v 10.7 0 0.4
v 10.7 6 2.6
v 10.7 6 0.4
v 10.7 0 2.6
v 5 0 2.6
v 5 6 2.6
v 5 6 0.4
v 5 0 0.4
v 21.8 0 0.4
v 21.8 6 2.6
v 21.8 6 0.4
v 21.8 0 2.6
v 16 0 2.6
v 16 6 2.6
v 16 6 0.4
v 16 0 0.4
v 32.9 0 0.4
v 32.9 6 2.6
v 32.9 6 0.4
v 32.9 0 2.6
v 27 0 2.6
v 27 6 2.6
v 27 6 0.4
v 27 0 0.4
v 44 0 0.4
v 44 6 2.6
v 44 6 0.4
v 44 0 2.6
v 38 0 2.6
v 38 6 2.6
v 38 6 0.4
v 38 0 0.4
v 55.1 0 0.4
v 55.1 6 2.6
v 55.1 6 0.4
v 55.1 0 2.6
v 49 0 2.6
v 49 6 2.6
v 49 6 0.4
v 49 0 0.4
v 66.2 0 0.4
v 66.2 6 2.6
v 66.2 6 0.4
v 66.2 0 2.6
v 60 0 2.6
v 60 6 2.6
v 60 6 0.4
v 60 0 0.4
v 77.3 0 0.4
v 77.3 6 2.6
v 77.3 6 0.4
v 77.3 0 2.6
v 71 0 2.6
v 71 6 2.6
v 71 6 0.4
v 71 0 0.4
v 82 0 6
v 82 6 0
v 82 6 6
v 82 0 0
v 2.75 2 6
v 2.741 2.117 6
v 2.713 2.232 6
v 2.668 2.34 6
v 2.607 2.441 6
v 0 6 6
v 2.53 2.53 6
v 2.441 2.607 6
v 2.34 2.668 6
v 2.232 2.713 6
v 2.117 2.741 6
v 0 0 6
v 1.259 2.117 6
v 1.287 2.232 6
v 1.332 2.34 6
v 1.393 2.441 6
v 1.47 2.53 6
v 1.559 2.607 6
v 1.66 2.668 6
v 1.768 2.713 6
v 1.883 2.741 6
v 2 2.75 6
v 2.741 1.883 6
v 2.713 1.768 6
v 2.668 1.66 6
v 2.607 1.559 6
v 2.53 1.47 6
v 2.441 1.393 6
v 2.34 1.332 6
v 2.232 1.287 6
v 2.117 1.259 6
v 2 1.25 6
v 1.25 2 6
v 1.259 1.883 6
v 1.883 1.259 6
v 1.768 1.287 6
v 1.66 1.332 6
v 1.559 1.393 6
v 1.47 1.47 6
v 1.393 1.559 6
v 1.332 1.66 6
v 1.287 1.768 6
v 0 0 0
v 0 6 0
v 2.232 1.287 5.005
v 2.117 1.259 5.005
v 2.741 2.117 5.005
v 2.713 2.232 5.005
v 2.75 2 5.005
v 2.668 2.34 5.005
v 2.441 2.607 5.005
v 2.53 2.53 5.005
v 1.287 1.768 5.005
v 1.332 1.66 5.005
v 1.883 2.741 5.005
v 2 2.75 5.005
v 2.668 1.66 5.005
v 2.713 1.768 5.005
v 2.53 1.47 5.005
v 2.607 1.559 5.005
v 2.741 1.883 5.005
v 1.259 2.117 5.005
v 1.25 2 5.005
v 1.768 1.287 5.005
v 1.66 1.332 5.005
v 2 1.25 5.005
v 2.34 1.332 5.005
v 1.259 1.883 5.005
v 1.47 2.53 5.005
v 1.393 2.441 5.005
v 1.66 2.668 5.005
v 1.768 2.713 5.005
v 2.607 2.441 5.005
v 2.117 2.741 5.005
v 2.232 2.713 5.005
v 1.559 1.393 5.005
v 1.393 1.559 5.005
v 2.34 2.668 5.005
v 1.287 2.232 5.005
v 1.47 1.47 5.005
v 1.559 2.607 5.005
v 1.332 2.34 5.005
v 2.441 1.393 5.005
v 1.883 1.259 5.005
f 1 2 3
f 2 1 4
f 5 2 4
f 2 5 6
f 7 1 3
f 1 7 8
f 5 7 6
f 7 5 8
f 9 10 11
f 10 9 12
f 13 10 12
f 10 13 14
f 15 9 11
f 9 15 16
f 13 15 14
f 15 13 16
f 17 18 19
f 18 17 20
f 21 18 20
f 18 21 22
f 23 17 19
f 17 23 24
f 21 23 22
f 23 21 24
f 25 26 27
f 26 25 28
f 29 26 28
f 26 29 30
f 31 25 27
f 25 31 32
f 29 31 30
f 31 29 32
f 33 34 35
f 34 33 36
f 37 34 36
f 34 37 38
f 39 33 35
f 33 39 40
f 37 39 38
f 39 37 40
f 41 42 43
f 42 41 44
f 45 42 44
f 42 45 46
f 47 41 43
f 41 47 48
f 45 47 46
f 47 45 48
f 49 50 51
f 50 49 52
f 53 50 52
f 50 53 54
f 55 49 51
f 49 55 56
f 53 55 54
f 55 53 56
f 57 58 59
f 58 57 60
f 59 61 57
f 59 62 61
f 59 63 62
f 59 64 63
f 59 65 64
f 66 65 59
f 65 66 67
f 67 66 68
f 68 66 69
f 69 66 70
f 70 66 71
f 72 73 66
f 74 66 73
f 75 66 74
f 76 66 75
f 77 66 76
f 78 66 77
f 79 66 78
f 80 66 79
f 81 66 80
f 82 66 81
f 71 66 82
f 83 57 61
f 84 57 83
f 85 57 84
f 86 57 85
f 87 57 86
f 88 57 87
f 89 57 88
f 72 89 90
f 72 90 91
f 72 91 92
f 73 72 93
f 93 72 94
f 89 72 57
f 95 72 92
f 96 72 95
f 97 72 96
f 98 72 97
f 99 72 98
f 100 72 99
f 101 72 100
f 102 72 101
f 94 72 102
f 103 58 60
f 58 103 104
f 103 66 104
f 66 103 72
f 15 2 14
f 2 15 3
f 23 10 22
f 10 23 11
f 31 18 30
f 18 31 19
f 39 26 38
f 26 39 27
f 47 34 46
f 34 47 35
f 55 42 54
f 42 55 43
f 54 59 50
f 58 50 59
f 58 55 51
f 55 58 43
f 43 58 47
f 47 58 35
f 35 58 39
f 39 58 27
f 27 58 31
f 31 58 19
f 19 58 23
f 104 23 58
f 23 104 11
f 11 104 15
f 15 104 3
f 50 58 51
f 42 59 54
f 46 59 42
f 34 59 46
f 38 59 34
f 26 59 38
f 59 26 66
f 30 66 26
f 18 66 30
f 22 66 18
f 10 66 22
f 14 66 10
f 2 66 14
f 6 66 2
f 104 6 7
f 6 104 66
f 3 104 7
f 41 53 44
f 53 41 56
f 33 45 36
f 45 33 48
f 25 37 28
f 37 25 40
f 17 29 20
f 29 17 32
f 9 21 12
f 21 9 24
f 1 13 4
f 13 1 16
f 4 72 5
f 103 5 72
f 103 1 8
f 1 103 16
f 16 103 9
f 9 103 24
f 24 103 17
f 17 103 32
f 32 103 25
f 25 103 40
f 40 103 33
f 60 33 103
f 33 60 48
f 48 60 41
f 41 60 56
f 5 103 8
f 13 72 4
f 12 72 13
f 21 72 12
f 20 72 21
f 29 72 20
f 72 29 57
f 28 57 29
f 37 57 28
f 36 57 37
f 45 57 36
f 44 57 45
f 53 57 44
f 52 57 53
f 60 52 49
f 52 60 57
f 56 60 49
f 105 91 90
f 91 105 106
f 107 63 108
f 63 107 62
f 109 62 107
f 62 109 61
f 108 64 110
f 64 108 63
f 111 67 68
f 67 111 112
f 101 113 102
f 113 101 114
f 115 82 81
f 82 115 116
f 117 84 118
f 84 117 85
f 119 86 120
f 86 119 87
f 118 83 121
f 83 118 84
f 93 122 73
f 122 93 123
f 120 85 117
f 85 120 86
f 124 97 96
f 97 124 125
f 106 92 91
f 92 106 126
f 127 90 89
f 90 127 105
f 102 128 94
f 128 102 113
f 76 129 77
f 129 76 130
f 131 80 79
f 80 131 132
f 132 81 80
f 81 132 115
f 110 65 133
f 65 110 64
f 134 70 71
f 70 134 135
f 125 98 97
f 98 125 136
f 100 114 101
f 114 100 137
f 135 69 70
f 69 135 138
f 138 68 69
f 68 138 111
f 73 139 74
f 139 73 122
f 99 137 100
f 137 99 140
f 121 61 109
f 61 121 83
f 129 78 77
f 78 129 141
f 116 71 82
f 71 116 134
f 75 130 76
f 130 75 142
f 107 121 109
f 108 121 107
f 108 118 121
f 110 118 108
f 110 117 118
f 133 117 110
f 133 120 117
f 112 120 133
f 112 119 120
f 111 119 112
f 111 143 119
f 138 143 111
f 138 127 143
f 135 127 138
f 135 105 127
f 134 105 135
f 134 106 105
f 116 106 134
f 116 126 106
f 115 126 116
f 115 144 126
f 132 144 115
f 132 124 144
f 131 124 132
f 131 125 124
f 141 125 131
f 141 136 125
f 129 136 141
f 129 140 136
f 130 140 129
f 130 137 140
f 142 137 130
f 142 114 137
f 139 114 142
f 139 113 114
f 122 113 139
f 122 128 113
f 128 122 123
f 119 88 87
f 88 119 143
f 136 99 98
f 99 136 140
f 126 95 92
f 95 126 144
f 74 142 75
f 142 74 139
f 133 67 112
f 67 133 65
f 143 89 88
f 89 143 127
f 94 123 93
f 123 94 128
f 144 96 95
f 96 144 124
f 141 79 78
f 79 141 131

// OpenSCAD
// Magnet Hole Tester for Gridfinity Module Generator
// Copyright 2023 Chris Cogdon
// Licence: CC-BY-SA-4.0 
// https://www.github.com/chmarr/gridfinity-boxes
//
// Creates a model to test various sizes of holes for the Gridfinity-common 6x2mm magnet,
// or magnets of any size by adjusting the parameters below. A "dot" is placed at the
// first, or smallest, hole to ease orientation.

// hole width for the middle hole. Typically the 'ideal' size.
median_hole_width=6.0; // [2.0:0.1:10.0]

// side difference between holes
step_size=0.1; // [0.05:0.01:0.2]

// number of holes. Should be an odd number so that the median_hole_width is the middle hole
number_of_holes=7; // [3:2:15]

// the height of the hole. Since we're intending to squeeze the sides, and that magnet heights are variable, this should be distinctly larger than the magnet height
hole_height=2.2; // [1.0:0.1:5.2]

// the height of the floor
floor_height=0.4; // [0.1:0.05:1.0]

/* [Advanced Options] */
// object depth
object_depth=6; // [5:1:15]

// object height
object_height=6; // [5:1:15]

// inter-hole spacing
interhole_spacing=5; // [2:1:10]

module customizer_stop () {}
epsilon=0.005;


module hole_sampler() {
    holes_to_either_side = (number_of_holes-1)/2;
    first_hole = median_hole_width - holes_to_either_side * step_size;
    object_width = median_hole_width * number_of_holes + interhole_spacing * (number_of_holes+1);
    
    difference() {
        cube([object_width, object_depth, object_height]);
        translate([interhole_spacing, -epsilon, floor_height])
            for(i=[0:number_of_holes-1]) {
                hole_size=first_hole + i*step_size;
                echo("Hole size:", hole_size)
                translate([i*(median_hole_width + interhole_spacing),0,0])
                    cube([hole_size, object_depth+2*epsilon, hole_height]);
            }
    translate([2,2,object_height-1+epsilon]) cylinder(h=1, d=1.5, $fn=40);
    }
}

hole_sampler();
